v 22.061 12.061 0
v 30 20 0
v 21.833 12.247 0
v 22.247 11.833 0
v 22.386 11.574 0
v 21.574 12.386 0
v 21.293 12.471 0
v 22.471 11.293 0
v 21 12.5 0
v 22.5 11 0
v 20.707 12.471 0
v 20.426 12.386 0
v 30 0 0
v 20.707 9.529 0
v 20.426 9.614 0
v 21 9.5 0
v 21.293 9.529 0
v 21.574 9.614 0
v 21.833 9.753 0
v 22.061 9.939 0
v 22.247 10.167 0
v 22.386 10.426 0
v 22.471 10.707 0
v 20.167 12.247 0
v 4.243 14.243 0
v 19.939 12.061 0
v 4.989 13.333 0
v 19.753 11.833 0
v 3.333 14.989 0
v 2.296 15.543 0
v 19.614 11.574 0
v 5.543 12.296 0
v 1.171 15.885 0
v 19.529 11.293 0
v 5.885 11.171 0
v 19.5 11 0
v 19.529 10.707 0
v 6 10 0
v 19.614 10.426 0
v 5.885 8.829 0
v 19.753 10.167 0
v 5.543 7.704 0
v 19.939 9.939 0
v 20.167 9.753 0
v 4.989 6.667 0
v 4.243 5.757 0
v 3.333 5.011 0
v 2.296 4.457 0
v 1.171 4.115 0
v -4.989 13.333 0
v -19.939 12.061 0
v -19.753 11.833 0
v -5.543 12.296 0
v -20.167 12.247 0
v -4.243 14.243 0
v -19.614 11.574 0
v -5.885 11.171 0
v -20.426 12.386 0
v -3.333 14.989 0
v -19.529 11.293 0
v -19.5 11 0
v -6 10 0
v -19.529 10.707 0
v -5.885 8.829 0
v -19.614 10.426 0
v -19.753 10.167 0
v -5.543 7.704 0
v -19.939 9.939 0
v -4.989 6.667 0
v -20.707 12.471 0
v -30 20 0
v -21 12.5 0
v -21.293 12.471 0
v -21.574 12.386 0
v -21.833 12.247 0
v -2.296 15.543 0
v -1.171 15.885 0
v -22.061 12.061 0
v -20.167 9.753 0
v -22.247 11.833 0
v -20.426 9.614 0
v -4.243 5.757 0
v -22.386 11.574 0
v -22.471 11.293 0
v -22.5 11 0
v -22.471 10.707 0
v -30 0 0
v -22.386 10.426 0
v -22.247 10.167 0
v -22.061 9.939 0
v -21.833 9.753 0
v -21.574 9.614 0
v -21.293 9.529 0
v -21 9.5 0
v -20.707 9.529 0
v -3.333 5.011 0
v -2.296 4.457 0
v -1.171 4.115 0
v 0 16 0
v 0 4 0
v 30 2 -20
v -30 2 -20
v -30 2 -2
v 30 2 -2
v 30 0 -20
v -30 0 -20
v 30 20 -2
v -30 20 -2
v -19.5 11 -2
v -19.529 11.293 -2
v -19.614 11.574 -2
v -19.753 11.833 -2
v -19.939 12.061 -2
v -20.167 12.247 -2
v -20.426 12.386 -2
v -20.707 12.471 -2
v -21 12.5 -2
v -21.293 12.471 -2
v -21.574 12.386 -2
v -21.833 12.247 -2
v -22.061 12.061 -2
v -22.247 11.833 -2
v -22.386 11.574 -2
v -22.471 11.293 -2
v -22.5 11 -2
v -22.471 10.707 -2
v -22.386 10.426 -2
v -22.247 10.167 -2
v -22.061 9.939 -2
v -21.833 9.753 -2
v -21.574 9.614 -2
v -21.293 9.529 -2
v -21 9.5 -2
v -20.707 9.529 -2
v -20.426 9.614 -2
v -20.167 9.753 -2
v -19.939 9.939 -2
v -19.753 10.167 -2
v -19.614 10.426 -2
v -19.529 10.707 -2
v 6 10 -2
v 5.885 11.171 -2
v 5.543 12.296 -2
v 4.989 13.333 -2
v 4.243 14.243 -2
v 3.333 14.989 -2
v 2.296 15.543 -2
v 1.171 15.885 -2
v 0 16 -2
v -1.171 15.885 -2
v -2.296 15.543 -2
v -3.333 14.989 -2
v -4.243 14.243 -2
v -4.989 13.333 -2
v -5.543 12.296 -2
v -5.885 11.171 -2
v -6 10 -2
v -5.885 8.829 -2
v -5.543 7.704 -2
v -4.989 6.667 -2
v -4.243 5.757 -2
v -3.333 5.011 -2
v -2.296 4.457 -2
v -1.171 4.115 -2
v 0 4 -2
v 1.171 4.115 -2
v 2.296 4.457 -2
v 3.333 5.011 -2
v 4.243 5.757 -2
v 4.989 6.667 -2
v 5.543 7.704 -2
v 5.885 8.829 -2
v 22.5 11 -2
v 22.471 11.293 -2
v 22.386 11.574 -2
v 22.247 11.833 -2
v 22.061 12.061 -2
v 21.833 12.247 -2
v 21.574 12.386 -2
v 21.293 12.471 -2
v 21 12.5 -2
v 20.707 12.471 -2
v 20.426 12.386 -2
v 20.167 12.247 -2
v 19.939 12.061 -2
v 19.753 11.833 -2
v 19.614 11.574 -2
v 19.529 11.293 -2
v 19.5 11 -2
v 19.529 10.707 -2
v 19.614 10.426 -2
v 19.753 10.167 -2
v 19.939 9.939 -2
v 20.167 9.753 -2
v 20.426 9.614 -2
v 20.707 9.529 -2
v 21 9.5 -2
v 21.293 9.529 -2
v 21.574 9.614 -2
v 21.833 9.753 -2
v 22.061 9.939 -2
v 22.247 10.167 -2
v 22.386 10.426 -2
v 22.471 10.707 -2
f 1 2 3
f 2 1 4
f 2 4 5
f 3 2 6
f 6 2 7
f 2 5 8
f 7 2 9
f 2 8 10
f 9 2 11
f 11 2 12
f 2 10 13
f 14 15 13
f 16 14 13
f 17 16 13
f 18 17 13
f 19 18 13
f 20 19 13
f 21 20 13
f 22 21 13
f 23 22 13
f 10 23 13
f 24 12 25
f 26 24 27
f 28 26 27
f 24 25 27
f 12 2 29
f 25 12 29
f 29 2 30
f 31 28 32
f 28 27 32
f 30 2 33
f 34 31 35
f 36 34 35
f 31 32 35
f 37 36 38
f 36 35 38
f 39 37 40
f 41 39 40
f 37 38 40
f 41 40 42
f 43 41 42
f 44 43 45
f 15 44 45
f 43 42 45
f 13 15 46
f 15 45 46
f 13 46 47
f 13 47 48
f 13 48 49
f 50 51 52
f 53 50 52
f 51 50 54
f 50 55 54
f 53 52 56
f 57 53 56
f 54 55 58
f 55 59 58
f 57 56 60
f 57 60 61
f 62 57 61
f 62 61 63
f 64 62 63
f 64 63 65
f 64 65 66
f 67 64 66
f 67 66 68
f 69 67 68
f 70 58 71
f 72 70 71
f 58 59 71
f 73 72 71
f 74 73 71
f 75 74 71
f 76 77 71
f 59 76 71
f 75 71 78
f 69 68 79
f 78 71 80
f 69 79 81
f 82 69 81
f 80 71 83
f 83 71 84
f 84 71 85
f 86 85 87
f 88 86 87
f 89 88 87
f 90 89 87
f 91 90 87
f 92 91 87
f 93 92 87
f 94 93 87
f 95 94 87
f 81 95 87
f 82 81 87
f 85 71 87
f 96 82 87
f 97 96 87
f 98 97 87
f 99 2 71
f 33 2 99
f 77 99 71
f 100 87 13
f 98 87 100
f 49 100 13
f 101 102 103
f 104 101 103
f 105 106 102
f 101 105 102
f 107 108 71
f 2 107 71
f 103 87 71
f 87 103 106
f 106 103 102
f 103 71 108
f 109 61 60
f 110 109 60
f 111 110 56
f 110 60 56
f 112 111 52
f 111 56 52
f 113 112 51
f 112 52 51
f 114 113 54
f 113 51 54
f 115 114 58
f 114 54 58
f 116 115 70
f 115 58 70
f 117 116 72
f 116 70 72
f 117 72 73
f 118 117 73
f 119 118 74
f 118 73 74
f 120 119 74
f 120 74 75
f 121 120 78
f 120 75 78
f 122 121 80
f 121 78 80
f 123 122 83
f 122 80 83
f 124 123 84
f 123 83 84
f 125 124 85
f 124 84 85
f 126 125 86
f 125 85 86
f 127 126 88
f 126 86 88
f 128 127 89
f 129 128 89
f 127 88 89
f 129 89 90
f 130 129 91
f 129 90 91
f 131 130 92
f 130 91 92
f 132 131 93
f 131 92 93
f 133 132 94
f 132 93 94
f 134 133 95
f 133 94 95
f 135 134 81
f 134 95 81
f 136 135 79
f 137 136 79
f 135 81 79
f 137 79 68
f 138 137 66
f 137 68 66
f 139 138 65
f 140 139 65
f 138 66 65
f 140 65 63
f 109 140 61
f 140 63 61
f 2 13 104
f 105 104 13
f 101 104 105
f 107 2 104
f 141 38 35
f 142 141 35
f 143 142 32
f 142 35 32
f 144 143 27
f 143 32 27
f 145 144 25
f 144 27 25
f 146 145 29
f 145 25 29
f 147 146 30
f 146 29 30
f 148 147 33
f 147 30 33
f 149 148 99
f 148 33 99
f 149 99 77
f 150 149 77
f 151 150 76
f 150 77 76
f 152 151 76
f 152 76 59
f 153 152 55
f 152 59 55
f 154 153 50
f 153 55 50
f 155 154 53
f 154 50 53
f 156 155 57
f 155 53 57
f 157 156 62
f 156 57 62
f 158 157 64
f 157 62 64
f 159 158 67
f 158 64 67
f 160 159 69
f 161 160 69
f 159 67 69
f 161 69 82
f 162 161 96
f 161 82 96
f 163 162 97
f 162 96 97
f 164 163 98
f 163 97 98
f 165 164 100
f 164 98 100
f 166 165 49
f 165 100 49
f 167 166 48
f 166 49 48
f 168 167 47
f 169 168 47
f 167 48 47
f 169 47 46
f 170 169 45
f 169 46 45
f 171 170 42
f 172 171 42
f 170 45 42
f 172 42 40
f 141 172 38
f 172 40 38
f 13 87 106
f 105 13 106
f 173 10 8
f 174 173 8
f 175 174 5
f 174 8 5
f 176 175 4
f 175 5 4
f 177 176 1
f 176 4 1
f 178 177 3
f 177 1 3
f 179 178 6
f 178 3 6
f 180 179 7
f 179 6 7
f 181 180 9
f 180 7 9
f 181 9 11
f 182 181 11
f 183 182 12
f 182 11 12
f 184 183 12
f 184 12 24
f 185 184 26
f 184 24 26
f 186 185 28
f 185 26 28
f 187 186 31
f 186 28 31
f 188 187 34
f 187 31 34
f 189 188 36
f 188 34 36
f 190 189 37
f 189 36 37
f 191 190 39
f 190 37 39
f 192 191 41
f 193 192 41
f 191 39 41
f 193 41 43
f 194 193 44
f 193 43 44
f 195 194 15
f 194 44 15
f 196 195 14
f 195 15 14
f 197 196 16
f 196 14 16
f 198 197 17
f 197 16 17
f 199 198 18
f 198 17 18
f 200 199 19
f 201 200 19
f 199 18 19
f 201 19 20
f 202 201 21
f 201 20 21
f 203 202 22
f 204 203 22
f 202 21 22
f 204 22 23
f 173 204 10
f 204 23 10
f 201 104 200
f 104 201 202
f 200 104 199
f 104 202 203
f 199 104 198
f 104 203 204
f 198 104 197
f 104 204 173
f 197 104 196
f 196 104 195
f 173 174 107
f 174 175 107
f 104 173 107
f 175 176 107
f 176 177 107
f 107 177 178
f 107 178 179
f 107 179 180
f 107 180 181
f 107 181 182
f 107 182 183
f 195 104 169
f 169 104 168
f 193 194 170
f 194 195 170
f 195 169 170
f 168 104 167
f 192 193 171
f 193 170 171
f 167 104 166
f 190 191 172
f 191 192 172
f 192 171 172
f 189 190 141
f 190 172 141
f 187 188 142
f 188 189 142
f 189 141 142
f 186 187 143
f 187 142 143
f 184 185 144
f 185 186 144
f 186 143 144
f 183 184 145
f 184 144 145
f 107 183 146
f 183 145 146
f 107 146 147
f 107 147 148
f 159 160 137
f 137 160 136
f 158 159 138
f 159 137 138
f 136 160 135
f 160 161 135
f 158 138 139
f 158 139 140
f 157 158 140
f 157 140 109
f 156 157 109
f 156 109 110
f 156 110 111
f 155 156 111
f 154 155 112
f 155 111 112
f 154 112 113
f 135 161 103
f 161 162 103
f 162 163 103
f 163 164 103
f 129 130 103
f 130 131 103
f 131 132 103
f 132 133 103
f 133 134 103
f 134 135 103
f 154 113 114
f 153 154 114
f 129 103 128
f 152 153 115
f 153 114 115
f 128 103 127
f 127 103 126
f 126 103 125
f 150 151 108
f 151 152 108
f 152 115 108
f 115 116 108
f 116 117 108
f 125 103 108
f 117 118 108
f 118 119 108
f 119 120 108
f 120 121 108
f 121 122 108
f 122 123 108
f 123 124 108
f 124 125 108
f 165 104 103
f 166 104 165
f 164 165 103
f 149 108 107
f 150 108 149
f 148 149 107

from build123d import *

# Parameters (mm, degrees)
BOSS_EXTRUDE1_DEPTH      = 30
BOSS_EXTRUDE1_DEPTH_BACK = 30
SKETCH2_R                = 1.5
SKETCH2_R_2              = 6
CUT_EXTRUDE1_DEPTH       = 2


with BuildPart() as part:
    # Sketch1 → Boss-Extrude1 (new, two sides: drawn at the far end of the back side and taken through both)
    with BuildSketch(Plane(origin=(0, 0, 0), x_dir=(0, 0, -1), z_dir=(1, 0, 0)).offset(-BOSS_EXTRUDE1_DEPTH_BACK)):
        Polygon((0, 20), (0, 0), (20, 0), (20, 2), (2, 2), (2, 20), align=None)
    extrude(amount=BOSS_EXTRUDE1_DEPTH + BOSS_EXTRUDE1_DEPTH_BACK)

    # Sketch2 → Cut-Extrude1 (cut)
    with BuildSketch(Plane.XY):
        with Locations((-21, 11)):
            Circle(SKETCH2_R)
        with Locations((21, 11)):
            Circle(SKETCH2_R)
        with Locations((0, 10)):
            Circle(SKETCH2_R_2)
    extrude(amount=-CUT_EXTRUDE1_DEPTH, mode=Mode.SUBTRACT)


solid = part.part
